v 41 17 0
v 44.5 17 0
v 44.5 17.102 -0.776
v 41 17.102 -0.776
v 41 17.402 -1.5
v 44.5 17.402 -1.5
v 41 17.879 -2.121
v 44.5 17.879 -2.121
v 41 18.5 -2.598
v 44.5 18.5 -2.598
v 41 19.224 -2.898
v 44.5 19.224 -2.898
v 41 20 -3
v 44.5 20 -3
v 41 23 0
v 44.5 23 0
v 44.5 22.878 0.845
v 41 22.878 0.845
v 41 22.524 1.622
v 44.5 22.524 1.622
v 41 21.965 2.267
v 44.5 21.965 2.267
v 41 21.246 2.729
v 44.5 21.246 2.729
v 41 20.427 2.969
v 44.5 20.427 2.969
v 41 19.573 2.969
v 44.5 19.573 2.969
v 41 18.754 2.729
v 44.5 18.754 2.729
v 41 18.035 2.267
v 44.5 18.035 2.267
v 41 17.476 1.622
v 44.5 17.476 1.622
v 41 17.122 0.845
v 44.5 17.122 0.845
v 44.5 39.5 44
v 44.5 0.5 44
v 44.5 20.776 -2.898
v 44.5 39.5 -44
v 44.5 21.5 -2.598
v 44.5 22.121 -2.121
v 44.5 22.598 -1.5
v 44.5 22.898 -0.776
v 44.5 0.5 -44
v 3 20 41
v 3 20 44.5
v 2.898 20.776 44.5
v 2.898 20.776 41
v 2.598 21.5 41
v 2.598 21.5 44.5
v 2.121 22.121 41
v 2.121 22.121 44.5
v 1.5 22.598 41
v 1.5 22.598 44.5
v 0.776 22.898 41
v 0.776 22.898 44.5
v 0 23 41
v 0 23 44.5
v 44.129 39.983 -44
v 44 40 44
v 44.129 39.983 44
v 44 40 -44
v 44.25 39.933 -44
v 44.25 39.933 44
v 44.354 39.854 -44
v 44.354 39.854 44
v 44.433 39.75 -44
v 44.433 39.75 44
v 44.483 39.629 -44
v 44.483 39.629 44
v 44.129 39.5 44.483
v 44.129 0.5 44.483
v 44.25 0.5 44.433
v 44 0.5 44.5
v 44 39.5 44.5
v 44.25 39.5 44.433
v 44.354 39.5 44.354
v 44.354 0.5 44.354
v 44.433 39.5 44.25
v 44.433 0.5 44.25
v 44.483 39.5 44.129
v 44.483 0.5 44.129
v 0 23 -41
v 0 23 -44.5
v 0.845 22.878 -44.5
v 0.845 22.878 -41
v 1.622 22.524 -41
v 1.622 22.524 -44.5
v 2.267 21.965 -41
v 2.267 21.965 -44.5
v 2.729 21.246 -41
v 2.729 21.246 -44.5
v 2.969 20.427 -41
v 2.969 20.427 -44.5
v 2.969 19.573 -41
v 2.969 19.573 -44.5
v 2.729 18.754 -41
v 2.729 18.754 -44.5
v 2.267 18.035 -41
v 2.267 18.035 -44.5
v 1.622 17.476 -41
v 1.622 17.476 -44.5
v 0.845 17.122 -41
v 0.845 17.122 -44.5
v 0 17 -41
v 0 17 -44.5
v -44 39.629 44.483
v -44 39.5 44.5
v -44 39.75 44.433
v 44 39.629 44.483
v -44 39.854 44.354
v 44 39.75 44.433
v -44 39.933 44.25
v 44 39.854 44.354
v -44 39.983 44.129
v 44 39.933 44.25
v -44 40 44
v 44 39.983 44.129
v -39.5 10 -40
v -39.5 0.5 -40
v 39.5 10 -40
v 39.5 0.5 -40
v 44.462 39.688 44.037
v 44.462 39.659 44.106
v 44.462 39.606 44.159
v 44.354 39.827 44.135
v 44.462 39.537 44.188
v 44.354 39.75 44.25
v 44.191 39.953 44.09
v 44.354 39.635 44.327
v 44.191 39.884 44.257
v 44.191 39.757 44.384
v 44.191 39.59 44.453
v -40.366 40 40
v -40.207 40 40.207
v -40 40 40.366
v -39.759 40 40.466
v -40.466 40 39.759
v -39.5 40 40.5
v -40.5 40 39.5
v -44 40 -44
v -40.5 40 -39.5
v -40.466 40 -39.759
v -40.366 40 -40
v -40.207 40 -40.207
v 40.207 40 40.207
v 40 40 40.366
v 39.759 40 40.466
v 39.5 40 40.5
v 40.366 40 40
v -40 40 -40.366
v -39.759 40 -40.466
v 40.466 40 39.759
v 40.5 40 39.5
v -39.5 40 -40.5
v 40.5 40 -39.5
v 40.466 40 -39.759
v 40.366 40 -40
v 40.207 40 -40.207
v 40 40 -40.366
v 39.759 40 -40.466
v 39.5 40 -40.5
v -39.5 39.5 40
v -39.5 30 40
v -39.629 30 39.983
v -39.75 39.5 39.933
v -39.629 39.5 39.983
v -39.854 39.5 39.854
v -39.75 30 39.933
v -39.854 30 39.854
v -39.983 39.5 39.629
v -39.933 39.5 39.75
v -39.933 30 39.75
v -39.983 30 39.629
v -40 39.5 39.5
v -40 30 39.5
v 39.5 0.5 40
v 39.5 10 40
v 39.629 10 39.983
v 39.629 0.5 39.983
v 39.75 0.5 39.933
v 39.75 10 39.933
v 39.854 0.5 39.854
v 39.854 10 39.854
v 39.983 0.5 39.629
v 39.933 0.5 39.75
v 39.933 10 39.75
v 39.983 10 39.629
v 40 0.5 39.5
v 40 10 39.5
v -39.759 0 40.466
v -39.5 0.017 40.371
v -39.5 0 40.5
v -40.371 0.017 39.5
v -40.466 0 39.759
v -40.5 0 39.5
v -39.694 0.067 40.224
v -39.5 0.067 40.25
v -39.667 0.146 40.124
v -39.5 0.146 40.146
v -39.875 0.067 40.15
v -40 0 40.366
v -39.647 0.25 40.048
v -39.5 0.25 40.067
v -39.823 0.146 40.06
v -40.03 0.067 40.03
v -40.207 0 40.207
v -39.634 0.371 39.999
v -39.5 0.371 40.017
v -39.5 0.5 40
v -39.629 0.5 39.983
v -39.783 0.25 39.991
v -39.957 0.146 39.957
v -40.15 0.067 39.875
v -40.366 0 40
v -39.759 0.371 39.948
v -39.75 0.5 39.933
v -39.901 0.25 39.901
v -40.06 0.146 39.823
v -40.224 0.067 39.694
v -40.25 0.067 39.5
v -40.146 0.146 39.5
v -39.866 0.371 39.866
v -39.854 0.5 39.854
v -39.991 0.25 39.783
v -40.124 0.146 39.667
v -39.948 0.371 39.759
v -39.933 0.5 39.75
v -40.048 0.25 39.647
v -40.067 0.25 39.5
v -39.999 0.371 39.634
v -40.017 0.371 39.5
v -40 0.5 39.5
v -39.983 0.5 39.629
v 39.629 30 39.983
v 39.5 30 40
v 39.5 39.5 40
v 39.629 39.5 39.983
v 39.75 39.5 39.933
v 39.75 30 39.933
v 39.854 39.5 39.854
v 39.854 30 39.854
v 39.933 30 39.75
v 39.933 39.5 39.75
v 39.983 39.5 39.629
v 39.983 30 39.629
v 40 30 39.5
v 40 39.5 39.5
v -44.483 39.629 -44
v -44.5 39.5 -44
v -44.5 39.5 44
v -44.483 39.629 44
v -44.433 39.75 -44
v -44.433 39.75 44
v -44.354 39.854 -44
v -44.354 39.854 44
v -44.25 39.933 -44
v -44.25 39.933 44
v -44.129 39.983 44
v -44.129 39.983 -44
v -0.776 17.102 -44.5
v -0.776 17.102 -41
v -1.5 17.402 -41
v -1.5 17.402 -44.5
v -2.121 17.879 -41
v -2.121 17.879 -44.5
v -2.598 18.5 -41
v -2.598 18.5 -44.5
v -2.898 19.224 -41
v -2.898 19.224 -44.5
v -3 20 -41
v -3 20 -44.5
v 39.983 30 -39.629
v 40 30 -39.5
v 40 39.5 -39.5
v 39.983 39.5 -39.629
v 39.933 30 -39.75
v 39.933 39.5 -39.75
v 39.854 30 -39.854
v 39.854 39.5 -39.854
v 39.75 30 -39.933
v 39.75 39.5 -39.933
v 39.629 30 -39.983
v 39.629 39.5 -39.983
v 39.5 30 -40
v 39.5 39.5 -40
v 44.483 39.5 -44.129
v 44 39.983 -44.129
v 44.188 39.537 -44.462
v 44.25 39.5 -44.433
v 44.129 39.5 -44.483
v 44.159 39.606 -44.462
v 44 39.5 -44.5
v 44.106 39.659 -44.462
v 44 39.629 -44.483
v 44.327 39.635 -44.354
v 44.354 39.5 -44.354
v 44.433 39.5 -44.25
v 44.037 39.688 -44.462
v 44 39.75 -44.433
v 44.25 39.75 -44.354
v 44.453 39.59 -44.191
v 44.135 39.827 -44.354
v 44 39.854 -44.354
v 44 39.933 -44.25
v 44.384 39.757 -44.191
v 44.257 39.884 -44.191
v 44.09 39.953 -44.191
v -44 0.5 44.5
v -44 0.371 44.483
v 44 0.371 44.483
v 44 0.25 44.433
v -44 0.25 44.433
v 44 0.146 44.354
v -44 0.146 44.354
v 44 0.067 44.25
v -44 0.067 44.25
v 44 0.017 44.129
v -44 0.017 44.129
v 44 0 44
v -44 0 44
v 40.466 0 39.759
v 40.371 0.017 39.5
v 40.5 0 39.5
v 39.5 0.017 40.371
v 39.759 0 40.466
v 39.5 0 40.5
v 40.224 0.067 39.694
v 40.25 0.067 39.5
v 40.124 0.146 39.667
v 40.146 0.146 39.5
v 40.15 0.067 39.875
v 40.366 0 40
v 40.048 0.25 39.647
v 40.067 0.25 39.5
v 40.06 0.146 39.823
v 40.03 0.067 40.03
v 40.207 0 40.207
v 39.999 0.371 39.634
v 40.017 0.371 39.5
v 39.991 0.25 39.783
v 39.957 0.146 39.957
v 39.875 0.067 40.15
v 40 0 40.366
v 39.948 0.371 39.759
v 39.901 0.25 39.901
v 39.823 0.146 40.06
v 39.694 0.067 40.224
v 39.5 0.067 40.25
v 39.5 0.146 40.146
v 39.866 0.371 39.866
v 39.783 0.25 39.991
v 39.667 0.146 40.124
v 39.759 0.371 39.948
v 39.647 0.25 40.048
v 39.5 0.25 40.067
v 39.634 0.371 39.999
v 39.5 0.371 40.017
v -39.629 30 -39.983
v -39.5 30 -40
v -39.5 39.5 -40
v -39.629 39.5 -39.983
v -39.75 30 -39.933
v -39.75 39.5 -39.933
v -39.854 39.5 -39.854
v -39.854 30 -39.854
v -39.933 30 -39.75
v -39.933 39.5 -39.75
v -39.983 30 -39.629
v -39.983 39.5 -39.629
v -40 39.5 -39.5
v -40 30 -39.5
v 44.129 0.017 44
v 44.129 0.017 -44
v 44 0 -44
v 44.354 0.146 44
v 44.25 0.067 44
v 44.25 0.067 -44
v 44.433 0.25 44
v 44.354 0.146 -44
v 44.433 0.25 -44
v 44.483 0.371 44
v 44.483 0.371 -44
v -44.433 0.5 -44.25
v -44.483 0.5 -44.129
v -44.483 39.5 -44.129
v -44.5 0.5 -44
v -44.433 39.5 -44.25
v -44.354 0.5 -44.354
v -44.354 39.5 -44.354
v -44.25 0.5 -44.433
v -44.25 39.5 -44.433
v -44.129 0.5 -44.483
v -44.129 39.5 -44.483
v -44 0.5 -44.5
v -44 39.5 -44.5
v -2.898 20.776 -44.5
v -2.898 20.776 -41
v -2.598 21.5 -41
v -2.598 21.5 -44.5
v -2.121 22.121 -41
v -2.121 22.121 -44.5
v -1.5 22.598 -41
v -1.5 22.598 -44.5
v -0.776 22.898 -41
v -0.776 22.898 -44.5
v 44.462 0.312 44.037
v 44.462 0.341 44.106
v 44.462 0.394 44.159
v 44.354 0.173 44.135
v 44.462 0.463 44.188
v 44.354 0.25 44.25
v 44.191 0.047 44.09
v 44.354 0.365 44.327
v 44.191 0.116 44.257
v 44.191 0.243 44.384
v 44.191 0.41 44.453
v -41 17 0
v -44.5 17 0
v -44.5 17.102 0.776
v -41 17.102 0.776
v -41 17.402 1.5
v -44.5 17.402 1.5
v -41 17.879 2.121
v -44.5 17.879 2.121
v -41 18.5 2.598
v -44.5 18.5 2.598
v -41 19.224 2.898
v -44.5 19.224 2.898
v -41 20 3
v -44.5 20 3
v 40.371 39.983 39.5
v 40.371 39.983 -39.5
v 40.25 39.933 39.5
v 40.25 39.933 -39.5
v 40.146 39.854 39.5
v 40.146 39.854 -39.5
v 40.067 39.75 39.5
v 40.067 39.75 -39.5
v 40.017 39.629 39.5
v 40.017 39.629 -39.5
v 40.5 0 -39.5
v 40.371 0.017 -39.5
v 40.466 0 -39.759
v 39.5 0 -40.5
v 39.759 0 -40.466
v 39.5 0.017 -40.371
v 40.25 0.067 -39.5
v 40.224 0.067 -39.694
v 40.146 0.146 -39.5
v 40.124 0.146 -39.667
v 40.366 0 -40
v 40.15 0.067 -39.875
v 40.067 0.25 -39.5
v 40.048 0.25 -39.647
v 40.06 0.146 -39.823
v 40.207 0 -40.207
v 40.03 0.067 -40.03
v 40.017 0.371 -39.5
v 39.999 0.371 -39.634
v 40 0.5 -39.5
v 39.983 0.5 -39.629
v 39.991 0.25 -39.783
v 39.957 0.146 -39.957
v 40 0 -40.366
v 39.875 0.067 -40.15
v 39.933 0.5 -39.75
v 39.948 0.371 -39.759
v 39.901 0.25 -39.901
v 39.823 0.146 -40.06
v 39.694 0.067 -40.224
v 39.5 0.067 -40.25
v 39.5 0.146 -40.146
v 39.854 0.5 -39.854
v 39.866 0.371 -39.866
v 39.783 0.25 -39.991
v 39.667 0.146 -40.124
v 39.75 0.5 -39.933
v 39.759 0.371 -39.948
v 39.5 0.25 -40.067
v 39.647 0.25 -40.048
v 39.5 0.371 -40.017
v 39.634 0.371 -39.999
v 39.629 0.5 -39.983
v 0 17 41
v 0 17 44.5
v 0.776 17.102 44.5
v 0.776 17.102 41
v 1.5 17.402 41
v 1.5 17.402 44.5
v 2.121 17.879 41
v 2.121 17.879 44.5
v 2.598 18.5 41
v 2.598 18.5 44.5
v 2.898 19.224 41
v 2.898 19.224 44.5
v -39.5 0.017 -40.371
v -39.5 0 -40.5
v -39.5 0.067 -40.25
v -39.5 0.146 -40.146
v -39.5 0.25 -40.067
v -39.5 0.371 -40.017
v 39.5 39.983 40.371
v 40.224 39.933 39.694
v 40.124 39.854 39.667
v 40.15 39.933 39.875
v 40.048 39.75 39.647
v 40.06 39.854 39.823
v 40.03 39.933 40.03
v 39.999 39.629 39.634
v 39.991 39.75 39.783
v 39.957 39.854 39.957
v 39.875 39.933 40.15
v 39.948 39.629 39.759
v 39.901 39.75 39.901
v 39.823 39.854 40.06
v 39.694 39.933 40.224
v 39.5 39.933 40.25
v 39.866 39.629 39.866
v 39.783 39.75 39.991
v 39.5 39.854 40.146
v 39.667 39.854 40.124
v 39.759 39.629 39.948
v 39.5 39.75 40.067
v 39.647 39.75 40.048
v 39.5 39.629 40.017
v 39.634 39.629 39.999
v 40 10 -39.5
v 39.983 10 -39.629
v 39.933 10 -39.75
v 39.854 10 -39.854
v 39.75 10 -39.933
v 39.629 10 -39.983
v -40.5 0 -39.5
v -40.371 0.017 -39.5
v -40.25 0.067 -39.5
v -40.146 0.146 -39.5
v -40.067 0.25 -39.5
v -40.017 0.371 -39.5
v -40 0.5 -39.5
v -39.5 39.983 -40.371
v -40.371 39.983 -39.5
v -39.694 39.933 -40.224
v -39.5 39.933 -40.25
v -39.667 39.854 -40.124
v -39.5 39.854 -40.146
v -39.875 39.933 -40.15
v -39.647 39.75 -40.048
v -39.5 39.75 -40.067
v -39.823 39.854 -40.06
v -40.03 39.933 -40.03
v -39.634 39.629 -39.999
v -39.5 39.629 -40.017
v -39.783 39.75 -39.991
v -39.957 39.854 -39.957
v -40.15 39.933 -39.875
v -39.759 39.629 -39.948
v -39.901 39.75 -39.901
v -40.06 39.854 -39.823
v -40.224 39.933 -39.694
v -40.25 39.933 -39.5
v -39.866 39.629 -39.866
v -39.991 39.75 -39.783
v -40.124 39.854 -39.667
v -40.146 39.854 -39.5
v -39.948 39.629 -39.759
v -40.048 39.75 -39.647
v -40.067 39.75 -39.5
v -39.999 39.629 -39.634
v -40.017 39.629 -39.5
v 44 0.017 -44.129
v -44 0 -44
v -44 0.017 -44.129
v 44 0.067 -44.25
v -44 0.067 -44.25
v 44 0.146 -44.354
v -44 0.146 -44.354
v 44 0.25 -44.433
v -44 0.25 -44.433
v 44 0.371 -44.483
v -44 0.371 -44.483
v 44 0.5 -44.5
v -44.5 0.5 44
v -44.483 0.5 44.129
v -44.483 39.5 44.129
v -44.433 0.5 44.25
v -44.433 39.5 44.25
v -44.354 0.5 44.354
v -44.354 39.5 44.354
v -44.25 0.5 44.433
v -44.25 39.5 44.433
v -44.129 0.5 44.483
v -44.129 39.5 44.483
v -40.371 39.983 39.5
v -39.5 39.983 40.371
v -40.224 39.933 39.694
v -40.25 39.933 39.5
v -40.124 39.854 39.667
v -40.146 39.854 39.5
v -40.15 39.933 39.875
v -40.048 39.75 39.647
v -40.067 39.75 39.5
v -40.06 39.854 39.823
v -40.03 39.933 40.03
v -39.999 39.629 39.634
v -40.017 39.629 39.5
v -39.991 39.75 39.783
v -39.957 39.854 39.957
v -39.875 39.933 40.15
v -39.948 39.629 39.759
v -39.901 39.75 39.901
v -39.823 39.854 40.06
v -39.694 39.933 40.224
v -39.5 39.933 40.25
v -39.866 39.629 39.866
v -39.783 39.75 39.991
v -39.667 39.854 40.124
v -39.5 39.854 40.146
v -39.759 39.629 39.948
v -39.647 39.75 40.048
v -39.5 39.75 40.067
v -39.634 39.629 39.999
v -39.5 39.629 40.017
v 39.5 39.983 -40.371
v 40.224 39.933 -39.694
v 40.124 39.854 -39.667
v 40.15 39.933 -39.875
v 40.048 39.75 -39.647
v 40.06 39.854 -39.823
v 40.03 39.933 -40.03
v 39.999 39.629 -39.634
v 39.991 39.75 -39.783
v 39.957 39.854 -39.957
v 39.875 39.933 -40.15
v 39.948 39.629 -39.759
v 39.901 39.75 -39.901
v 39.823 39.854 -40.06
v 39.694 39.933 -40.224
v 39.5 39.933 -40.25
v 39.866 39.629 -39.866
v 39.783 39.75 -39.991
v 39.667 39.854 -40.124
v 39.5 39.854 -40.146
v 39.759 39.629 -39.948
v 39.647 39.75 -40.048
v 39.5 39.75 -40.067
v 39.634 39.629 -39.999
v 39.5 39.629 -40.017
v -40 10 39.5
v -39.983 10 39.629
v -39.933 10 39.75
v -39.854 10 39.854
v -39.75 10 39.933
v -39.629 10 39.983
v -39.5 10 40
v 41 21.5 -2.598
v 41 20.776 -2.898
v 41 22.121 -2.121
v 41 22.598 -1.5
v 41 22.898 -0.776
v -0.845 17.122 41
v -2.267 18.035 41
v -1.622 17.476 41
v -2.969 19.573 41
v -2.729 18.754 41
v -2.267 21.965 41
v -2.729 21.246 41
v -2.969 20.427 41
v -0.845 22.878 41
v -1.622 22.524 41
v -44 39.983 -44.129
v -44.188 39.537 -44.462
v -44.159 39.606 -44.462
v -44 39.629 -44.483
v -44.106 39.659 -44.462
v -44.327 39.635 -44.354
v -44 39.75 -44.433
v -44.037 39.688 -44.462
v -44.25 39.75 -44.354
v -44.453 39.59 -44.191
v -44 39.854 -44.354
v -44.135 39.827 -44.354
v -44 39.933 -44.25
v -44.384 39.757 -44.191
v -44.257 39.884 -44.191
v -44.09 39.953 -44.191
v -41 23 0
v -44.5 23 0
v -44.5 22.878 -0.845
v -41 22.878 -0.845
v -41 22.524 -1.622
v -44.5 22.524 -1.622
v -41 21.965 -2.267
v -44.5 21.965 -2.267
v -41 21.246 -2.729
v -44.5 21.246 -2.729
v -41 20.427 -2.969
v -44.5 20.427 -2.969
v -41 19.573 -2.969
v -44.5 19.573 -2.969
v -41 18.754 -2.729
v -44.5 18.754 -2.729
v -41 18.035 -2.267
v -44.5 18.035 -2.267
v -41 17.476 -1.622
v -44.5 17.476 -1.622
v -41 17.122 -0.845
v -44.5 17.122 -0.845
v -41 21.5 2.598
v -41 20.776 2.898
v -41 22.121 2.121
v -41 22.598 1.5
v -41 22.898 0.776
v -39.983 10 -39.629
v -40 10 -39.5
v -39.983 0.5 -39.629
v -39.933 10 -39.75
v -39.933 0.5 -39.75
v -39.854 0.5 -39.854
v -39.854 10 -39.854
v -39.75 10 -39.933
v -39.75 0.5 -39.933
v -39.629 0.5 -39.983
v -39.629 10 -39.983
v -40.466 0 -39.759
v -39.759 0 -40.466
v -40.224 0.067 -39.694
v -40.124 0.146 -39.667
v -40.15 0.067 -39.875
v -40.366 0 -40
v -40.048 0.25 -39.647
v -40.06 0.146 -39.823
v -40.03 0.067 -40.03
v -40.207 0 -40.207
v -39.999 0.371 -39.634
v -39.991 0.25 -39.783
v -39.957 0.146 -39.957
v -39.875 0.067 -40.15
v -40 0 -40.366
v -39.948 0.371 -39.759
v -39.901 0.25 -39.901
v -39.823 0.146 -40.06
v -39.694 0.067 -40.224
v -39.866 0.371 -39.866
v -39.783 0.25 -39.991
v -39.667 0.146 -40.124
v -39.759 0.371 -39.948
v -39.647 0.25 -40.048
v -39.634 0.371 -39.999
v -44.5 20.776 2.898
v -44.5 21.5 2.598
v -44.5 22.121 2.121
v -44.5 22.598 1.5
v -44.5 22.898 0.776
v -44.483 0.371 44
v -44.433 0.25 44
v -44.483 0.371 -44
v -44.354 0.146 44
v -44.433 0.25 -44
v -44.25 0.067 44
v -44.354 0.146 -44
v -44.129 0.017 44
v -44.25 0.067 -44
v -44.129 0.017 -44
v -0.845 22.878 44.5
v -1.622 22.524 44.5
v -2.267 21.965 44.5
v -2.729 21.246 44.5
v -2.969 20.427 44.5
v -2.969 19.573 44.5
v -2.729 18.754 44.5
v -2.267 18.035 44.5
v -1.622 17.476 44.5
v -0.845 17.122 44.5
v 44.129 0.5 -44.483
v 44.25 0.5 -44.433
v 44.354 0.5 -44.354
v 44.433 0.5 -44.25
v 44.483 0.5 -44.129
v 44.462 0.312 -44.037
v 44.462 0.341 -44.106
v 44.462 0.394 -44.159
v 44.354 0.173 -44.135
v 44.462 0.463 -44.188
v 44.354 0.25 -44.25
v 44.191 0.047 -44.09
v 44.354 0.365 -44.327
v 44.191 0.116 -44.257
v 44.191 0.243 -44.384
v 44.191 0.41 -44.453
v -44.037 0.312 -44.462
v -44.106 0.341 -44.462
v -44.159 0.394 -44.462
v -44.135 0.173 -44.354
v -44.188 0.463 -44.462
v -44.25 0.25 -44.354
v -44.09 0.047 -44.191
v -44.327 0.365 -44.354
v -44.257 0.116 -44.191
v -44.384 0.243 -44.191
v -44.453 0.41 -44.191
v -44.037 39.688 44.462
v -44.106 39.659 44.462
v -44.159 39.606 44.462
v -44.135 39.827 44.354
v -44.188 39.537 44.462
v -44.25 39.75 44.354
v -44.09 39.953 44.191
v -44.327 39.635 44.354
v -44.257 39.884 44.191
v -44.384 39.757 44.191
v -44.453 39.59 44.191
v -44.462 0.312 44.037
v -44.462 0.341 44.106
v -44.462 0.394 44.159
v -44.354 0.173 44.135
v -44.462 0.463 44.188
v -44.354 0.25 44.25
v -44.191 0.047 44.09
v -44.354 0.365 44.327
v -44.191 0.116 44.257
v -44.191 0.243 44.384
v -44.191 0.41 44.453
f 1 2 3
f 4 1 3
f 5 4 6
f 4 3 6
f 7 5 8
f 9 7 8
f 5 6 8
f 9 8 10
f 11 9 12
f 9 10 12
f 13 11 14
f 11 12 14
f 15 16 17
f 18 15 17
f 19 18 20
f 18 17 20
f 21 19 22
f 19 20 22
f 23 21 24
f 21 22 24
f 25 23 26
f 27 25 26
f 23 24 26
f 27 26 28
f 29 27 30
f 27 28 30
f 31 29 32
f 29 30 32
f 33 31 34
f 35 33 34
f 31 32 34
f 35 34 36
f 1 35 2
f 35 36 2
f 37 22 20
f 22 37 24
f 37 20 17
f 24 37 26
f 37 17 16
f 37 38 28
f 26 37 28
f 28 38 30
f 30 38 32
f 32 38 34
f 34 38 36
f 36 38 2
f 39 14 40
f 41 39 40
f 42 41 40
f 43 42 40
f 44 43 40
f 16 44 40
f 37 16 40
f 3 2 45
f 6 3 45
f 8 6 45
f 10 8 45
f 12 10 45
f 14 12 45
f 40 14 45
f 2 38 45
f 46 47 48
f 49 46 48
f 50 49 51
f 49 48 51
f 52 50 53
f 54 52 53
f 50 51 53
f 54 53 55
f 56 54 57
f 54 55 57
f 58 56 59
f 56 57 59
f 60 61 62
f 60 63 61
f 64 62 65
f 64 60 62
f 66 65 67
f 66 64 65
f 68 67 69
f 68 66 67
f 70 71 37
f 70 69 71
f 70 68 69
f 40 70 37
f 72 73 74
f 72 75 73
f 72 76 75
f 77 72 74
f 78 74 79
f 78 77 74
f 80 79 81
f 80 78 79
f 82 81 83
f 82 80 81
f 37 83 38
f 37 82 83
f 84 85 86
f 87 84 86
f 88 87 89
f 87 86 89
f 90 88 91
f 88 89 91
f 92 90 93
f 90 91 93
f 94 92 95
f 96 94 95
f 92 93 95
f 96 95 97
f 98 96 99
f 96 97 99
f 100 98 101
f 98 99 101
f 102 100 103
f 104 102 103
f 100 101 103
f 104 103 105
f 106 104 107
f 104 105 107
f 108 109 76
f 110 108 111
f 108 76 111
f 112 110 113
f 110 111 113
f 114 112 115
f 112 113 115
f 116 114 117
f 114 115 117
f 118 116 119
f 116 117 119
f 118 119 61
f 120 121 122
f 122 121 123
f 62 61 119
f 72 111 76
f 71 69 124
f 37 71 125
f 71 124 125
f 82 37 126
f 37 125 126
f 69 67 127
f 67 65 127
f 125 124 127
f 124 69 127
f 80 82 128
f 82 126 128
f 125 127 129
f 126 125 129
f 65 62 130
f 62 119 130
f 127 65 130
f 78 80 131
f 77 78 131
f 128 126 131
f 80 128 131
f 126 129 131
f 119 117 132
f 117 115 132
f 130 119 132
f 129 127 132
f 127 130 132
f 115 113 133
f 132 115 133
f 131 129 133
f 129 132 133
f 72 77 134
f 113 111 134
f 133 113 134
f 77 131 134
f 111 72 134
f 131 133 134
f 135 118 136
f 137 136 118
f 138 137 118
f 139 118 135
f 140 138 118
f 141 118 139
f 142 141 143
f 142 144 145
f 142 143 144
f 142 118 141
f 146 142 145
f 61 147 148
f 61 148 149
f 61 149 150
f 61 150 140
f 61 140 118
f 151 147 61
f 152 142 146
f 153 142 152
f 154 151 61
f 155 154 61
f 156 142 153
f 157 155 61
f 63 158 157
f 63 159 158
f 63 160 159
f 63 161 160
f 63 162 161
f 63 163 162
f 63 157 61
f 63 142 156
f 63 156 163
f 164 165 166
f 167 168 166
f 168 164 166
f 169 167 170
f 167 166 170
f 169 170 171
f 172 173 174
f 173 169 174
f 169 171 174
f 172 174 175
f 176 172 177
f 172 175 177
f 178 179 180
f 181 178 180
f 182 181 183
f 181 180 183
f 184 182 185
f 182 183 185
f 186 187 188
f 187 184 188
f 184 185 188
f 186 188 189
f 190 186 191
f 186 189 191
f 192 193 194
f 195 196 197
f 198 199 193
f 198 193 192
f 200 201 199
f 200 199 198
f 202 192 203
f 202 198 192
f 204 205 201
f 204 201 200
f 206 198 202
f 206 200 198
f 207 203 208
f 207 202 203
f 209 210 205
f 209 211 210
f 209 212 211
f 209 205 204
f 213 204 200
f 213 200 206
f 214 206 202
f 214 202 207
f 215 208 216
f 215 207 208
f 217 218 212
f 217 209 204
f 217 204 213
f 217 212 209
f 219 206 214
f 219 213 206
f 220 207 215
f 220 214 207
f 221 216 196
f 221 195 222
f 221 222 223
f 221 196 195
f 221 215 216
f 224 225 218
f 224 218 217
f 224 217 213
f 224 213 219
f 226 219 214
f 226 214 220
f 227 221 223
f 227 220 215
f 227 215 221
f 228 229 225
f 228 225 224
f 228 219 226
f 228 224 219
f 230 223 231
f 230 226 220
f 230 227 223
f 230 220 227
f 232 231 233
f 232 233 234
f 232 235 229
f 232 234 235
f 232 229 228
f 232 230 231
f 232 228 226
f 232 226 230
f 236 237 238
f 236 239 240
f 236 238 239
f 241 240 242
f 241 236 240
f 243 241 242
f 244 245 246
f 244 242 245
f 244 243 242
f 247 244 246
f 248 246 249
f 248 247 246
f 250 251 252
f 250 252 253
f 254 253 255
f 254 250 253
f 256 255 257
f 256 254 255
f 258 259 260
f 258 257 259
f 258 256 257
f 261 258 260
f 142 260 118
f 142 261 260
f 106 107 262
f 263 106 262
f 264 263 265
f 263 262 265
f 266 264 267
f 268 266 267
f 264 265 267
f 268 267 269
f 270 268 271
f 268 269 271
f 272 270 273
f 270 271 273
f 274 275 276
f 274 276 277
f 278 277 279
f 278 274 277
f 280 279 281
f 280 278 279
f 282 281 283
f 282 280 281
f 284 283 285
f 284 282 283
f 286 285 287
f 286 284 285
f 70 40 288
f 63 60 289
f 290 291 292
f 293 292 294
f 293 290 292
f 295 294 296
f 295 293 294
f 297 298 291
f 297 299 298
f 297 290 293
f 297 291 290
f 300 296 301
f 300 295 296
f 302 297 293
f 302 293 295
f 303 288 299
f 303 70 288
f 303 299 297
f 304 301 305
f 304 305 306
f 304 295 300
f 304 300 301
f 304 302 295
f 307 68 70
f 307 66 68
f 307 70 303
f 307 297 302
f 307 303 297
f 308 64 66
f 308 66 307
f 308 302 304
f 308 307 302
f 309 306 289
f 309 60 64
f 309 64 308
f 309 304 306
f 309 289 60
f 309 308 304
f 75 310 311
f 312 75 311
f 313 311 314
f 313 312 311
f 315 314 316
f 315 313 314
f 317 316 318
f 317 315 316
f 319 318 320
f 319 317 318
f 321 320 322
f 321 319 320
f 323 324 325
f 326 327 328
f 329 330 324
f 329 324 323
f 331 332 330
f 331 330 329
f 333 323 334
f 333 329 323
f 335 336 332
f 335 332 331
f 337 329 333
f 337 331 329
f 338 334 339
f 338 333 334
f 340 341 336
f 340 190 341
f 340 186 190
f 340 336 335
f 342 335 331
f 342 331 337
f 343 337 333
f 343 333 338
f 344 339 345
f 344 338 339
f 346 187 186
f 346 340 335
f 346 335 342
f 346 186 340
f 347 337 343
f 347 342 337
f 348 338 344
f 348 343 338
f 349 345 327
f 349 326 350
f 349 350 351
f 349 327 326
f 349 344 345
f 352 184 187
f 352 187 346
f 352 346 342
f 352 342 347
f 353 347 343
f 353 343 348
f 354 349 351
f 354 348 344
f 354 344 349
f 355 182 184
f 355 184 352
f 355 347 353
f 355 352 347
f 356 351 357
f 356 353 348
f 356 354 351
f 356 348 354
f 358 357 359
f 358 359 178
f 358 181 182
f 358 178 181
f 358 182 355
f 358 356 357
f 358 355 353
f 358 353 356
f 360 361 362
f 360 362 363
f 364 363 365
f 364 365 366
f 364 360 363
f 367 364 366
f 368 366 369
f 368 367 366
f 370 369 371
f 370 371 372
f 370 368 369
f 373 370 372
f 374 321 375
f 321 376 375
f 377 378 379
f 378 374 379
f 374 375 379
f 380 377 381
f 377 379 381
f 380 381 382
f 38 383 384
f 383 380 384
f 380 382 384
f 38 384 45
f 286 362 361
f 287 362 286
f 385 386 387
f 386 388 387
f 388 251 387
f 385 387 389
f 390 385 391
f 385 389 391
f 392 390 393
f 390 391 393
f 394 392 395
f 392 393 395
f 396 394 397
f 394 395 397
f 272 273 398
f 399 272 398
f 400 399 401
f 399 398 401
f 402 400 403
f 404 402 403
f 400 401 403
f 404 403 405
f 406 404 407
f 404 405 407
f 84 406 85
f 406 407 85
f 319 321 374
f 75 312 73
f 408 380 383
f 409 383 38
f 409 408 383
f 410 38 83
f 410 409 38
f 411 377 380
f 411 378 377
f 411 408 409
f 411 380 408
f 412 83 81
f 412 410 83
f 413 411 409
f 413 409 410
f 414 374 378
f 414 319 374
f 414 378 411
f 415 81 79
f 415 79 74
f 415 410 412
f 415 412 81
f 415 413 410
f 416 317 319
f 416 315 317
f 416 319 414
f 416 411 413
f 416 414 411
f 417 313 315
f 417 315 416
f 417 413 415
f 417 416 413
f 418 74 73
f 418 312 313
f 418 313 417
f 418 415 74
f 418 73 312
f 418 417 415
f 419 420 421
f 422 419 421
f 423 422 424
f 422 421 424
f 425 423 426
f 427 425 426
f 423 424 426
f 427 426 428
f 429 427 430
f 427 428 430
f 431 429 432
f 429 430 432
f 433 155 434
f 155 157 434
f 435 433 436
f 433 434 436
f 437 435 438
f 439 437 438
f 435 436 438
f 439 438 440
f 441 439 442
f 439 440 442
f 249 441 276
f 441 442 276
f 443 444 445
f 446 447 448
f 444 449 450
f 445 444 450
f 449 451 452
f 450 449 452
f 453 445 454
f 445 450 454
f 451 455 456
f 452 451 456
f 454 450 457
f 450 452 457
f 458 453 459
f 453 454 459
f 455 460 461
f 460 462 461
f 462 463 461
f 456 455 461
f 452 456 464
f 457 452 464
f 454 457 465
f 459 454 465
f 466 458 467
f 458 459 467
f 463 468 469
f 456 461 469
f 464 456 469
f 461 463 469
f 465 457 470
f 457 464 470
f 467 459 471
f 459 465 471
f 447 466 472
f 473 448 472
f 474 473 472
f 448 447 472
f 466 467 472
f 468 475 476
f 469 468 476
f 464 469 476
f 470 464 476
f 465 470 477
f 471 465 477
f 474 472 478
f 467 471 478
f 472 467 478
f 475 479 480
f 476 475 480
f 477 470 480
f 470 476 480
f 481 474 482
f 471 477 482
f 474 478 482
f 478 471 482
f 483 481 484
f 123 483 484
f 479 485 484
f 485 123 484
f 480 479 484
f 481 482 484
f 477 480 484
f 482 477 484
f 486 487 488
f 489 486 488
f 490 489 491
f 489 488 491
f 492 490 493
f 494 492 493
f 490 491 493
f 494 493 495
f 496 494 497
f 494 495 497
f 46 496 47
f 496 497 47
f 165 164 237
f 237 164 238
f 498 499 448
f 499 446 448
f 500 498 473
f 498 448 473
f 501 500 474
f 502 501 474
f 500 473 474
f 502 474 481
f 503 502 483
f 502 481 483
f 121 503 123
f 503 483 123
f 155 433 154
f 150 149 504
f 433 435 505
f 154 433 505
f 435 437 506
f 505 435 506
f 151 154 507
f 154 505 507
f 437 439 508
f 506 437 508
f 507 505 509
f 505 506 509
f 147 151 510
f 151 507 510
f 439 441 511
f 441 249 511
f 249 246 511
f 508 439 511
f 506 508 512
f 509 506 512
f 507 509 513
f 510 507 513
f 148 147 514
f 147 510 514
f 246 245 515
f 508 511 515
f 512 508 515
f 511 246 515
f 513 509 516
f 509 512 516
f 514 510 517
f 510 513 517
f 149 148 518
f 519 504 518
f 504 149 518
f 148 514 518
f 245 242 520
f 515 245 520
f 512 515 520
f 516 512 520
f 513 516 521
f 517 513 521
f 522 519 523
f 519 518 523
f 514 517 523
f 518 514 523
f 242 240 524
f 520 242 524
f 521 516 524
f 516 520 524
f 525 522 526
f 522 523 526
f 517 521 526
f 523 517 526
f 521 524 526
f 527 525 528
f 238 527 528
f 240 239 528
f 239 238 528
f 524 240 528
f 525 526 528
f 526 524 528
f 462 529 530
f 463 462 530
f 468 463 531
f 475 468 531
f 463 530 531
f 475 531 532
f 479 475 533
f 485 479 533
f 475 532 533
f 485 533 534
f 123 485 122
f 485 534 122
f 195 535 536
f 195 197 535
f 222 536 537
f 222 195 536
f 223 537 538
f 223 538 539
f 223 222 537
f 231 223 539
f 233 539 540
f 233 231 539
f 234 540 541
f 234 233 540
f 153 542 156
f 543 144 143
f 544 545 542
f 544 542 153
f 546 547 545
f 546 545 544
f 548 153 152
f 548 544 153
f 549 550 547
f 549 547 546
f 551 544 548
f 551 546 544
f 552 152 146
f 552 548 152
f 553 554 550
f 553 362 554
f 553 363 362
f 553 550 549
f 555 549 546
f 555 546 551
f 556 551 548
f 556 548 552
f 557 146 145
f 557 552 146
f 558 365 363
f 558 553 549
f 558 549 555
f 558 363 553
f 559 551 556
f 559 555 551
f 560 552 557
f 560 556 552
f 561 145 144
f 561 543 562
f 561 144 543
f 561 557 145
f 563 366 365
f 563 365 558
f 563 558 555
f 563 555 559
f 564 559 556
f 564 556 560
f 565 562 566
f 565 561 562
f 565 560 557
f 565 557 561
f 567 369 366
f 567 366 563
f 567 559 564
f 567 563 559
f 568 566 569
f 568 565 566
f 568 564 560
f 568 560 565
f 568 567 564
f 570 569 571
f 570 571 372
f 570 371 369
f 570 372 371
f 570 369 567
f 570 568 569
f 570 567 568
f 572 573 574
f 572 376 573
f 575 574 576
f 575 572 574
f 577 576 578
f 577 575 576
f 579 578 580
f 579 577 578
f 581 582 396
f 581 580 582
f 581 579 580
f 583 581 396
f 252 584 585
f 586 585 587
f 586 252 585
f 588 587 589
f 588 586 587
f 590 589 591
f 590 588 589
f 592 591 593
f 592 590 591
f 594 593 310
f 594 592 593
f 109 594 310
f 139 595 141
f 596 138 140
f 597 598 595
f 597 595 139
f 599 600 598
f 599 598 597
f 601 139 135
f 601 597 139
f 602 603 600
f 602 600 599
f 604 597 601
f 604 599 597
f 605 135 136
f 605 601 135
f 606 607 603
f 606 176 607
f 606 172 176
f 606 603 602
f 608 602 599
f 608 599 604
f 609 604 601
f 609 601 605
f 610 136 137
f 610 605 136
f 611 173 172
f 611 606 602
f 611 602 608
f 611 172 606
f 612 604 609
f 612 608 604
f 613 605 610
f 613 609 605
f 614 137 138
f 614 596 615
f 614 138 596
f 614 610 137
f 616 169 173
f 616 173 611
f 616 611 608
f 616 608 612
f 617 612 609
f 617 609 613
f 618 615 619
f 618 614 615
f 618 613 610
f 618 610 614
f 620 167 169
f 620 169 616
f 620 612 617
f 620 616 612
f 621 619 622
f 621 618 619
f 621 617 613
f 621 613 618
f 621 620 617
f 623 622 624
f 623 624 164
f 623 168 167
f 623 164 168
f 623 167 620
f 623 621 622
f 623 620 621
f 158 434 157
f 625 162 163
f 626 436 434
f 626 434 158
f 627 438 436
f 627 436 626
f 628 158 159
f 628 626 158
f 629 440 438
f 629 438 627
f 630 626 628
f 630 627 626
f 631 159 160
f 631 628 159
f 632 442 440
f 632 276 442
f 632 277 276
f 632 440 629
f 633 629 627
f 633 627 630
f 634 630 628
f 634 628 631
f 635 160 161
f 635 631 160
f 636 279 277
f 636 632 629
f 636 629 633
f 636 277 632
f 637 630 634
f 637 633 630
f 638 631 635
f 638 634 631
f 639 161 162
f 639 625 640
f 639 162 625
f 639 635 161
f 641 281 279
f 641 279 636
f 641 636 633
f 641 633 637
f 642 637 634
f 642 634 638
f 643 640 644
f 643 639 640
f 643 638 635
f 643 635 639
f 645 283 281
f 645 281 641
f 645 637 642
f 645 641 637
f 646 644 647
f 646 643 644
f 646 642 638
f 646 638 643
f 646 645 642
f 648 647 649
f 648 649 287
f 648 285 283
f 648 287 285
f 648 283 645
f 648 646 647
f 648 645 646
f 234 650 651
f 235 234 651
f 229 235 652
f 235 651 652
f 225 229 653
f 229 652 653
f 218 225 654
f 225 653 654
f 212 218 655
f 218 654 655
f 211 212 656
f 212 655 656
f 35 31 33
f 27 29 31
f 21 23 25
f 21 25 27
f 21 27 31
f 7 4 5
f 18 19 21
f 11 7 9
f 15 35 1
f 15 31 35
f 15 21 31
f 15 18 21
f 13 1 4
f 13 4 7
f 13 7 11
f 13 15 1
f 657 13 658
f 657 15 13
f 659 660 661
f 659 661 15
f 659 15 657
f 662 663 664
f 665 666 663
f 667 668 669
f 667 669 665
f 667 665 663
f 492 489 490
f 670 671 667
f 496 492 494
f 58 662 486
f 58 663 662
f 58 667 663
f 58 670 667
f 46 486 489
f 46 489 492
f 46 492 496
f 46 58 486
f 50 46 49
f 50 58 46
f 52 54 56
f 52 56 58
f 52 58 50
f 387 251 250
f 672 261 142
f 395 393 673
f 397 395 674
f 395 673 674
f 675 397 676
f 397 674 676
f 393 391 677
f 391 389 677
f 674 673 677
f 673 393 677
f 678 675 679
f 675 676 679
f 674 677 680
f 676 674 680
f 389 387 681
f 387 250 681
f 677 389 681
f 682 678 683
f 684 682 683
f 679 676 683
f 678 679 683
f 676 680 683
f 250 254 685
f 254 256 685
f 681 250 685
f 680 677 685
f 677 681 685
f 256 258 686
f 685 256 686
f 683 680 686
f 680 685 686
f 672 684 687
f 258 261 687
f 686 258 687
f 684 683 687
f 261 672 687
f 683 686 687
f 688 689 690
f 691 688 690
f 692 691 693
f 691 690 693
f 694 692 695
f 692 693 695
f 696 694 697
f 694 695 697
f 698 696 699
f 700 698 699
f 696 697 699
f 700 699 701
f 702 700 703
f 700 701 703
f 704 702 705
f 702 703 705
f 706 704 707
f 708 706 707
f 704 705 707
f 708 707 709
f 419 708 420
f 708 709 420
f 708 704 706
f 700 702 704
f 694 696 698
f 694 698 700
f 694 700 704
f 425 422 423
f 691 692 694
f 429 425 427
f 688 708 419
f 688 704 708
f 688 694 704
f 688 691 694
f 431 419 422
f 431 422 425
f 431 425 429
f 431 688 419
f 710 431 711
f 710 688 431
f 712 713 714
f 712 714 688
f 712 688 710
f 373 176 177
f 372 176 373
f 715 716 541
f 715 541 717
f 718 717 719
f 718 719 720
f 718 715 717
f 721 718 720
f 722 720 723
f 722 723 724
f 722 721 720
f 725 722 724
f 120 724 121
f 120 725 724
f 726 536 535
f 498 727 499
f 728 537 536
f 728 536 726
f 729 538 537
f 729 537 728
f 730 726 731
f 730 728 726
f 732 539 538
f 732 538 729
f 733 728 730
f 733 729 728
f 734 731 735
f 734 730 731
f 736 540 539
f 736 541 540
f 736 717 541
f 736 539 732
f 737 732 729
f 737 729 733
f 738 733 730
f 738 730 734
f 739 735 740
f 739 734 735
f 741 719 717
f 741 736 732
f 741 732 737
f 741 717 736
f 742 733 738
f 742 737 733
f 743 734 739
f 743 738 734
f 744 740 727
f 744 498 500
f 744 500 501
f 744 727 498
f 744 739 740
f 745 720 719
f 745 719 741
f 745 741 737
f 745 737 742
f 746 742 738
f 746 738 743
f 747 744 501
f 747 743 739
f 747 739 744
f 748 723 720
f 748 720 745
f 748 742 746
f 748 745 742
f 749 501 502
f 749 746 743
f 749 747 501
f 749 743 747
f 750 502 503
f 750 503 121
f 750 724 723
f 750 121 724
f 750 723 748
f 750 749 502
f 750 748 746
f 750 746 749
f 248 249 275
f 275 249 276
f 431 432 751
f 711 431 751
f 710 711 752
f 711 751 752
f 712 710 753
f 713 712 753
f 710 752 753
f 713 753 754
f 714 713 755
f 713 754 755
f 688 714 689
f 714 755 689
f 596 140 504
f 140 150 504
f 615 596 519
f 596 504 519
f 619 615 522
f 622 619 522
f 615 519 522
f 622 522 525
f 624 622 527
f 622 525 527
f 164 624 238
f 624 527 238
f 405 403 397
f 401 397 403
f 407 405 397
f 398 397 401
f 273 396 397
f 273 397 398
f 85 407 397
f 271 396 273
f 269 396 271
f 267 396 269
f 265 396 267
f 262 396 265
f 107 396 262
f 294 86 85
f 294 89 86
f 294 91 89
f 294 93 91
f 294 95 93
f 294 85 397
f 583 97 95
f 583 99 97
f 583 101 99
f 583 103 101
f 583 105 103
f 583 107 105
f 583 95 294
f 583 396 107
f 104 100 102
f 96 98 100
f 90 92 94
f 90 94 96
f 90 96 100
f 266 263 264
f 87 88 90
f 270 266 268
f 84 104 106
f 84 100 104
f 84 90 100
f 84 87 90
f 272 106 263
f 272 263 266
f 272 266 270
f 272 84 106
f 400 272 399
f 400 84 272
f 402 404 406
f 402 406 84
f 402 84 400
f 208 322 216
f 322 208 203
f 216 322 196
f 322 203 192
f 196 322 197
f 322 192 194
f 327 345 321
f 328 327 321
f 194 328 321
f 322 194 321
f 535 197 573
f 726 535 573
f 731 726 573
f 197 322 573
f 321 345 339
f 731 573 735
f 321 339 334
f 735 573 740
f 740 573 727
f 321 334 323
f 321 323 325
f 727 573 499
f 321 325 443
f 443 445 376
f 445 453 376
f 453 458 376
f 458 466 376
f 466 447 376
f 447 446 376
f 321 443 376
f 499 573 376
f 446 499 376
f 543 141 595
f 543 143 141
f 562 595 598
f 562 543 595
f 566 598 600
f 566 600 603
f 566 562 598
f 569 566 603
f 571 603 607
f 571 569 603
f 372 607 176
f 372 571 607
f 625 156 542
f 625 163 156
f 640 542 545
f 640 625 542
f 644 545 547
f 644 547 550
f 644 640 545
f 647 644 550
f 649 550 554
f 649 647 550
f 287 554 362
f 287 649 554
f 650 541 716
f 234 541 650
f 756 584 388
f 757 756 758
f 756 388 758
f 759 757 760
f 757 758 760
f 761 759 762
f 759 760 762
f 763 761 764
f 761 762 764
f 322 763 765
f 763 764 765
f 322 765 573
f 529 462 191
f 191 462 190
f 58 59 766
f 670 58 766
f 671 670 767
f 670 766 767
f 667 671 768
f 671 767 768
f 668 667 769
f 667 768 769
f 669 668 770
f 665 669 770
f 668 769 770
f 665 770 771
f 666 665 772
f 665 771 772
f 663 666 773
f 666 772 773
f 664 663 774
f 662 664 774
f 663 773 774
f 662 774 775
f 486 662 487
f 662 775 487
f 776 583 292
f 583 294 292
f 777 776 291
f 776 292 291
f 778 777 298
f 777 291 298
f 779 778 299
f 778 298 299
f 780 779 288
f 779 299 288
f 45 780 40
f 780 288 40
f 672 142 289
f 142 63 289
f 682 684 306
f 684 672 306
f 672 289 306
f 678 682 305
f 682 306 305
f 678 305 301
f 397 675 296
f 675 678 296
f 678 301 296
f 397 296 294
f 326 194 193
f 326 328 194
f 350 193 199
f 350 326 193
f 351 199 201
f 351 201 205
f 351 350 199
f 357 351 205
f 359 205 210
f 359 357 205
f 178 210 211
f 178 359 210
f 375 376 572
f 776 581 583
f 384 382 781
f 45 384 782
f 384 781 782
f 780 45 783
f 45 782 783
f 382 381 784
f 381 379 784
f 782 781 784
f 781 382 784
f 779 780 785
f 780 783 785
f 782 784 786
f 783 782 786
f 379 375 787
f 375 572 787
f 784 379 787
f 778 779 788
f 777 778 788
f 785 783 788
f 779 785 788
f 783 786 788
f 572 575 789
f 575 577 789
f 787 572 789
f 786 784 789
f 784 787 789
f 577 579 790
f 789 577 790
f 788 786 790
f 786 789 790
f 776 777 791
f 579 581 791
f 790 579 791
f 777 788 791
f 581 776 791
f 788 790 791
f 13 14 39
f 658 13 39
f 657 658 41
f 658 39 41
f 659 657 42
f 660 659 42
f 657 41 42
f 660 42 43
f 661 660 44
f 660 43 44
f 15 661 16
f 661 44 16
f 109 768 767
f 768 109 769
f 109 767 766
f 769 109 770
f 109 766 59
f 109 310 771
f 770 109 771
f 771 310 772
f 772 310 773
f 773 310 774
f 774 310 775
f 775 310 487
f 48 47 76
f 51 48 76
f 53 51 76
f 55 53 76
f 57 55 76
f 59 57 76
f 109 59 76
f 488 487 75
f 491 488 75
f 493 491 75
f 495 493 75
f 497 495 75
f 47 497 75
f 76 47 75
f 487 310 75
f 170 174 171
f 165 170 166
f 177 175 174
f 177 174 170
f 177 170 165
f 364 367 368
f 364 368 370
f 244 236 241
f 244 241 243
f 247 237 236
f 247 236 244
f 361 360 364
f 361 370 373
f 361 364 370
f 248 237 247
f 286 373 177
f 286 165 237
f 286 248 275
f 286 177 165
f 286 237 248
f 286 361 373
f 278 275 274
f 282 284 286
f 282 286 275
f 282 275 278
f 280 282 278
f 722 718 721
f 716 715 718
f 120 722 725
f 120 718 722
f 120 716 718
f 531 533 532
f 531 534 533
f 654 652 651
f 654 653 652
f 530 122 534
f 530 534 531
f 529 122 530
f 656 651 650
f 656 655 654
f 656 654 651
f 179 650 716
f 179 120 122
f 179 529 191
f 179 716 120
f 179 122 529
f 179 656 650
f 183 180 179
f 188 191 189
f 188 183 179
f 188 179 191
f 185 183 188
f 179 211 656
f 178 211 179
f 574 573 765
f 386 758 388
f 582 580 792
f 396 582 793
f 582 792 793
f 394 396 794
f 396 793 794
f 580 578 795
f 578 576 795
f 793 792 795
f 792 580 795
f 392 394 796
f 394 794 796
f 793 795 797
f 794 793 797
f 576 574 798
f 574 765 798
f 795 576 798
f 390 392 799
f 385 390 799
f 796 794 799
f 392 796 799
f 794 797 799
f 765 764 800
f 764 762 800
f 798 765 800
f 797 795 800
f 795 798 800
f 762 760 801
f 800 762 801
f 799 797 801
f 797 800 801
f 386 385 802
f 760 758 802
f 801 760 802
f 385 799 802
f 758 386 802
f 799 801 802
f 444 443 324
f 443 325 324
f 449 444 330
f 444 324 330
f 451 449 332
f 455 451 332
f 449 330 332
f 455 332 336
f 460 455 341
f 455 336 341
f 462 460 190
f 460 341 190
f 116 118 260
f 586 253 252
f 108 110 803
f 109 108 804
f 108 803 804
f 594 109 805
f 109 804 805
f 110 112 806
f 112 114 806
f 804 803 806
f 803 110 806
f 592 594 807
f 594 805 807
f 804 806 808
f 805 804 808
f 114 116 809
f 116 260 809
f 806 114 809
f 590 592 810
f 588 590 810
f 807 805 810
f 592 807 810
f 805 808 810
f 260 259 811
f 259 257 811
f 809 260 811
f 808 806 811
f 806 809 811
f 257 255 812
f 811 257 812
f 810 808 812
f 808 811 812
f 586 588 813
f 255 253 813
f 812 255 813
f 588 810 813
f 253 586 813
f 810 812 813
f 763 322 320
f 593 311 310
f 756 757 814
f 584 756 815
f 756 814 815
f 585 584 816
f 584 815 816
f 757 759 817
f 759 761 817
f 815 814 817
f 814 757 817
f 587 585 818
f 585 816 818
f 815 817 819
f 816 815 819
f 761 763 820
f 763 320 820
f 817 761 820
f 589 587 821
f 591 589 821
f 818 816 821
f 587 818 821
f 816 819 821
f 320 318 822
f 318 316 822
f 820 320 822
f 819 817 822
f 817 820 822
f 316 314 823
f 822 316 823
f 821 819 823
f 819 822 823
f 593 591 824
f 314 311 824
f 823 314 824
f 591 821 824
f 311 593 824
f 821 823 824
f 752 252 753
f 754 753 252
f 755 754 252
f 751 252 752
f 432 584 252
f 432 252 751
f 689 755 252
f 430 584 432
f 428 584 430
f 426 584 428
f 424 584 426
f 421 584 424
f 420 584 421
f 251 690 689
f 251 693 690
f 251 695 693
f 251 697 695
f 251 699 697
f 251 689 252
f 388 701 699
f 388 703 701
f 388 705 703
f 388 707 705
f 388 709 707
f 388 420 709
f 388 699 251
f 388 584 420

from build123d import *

# Parameters (mm, degrees)
SKETCH2_W           = 89
SKETCH2_H           = 89
BOSS_EXTRUDE1_DEPTH = 40
SKETCH5_W           = 80
SKETCH5_H           = 80
CUT_EXTRUDE3_DEPTH  = 10
SKETCH4_W           = 80
SKETCH4_H           = 80
CUT_EXTRUDE5_DEPTH  = 10
CUT_EXTRUDE6_DEPTH  = 3.5
CIRPATTERN1_COUNT   = 4
FILLET1_R           = 0.5


with BuildPart() as part:
    # Sketch2 → Boss-Extrude1 (new body)
    with BuildSketch(Plane(origin=(0, 0, 0), x_dir=(1, 0, 0), z_dir=(0, 1, 0))):
        Rectangle(SKETCH2_W, SKETCH2_H)
    extrude(amount=BOSS_EXTRUDE1_DEPTH)

    # Sketch5 → Cut-Extrude3 (cut)
    with BuildSketch(Plane.XZ):
        Rectangle(SKETCH5_W, SKETCH5_H)
    extrude(amount=-CUT_EXTRUDE3_DEPTH, mode=Mode.SUBTRACT)

    # Sketch4 → Cut-Extrude5 (cut)
    with BuildSketch(Plane(origin=(0, 40, 0), x_dir=(1, 0, 0), z_dir=(0, 1, 0))):
        Rectangle(SKETCH4_W, SKETCH4_H)
    extrude(amount=-CUT_EXTRUDE5_DEPTH, mode=Mode.SUBTRACT)

    # Sketch6 → Cut-Extrude6 (cut)
    with BuildSketch(Plane(origin=(44.5, 0, 0), x_dir=(0, 0, -1), z_dir=(1, 0, 0))):
        with BuildLine():
            ThreePointArc((3, 20), (2.121320344, 22.121320344), (0, 23))
            Line((0, 23), (0, 17))
            ThreePointArc((0, 17), (2.121320344, 17.878679656), (3, 20))
        make_face()
        with BuildLine():
            Line((0, 17), (0, 23))
            ThreePointArc((0, 23), (-3, 20), (0, 17))
        make_face()
    cut_extrude6 = extrude(amount=-CUT_EXTRUDE6_DEPTH, mode=Mode.SUBTRACT)

    # CirPattern1: Cut-Extrude6 ×4 about axis
    cirpattern1_axis = Axis((0, 10, 0), (0, -1, 0))
    for i in range(1, CIRPATTERN1_COUNT):
        add(cut_extrude6.rotate(cirpattern1_axis, i * 360 / CIRPATTERN1_COUNT), mode=Mode.SUBTRACT)

    # Fillet1
    fillet1_edges = [part.edges().sort_by_distance(p)[0] for p in [
        (-44.5, 40, 0),
        (0, 40, 44.5),
        (40, 5, 40),
        (40, 5, -40),
        (-40, 5, -40),
        (-40, 5, 40),
        (40, 0, 0),
        (0, 0, 40),
        (-40, 0, 0),
        (0, 0, -40),
        (40, 35, -40),
        (40, 35, 40),
        (-40, 35, 40),
        (-40, 35, -40),
        (40, 40, 0),
        (0, 40, -40),
        (-40, 40, 0),
        (0, 40, 40),
        (44.5, 40, 0),
        (0, 0, 44.5),
        (-44.5, 0, 0),
        (0, 0, -44.5),
        (44.5, 0, 0),
        (44.5, 20, 44.5),
        (-44.5, 20, 44.5),
        (-44.5, 20, -44.5),
        (44.5, 20, -44.5),
        (0, 40, -44.5),
    ]]
    fillet(fillet1_edges, radius=FILLET1_R)


solid = part.part
